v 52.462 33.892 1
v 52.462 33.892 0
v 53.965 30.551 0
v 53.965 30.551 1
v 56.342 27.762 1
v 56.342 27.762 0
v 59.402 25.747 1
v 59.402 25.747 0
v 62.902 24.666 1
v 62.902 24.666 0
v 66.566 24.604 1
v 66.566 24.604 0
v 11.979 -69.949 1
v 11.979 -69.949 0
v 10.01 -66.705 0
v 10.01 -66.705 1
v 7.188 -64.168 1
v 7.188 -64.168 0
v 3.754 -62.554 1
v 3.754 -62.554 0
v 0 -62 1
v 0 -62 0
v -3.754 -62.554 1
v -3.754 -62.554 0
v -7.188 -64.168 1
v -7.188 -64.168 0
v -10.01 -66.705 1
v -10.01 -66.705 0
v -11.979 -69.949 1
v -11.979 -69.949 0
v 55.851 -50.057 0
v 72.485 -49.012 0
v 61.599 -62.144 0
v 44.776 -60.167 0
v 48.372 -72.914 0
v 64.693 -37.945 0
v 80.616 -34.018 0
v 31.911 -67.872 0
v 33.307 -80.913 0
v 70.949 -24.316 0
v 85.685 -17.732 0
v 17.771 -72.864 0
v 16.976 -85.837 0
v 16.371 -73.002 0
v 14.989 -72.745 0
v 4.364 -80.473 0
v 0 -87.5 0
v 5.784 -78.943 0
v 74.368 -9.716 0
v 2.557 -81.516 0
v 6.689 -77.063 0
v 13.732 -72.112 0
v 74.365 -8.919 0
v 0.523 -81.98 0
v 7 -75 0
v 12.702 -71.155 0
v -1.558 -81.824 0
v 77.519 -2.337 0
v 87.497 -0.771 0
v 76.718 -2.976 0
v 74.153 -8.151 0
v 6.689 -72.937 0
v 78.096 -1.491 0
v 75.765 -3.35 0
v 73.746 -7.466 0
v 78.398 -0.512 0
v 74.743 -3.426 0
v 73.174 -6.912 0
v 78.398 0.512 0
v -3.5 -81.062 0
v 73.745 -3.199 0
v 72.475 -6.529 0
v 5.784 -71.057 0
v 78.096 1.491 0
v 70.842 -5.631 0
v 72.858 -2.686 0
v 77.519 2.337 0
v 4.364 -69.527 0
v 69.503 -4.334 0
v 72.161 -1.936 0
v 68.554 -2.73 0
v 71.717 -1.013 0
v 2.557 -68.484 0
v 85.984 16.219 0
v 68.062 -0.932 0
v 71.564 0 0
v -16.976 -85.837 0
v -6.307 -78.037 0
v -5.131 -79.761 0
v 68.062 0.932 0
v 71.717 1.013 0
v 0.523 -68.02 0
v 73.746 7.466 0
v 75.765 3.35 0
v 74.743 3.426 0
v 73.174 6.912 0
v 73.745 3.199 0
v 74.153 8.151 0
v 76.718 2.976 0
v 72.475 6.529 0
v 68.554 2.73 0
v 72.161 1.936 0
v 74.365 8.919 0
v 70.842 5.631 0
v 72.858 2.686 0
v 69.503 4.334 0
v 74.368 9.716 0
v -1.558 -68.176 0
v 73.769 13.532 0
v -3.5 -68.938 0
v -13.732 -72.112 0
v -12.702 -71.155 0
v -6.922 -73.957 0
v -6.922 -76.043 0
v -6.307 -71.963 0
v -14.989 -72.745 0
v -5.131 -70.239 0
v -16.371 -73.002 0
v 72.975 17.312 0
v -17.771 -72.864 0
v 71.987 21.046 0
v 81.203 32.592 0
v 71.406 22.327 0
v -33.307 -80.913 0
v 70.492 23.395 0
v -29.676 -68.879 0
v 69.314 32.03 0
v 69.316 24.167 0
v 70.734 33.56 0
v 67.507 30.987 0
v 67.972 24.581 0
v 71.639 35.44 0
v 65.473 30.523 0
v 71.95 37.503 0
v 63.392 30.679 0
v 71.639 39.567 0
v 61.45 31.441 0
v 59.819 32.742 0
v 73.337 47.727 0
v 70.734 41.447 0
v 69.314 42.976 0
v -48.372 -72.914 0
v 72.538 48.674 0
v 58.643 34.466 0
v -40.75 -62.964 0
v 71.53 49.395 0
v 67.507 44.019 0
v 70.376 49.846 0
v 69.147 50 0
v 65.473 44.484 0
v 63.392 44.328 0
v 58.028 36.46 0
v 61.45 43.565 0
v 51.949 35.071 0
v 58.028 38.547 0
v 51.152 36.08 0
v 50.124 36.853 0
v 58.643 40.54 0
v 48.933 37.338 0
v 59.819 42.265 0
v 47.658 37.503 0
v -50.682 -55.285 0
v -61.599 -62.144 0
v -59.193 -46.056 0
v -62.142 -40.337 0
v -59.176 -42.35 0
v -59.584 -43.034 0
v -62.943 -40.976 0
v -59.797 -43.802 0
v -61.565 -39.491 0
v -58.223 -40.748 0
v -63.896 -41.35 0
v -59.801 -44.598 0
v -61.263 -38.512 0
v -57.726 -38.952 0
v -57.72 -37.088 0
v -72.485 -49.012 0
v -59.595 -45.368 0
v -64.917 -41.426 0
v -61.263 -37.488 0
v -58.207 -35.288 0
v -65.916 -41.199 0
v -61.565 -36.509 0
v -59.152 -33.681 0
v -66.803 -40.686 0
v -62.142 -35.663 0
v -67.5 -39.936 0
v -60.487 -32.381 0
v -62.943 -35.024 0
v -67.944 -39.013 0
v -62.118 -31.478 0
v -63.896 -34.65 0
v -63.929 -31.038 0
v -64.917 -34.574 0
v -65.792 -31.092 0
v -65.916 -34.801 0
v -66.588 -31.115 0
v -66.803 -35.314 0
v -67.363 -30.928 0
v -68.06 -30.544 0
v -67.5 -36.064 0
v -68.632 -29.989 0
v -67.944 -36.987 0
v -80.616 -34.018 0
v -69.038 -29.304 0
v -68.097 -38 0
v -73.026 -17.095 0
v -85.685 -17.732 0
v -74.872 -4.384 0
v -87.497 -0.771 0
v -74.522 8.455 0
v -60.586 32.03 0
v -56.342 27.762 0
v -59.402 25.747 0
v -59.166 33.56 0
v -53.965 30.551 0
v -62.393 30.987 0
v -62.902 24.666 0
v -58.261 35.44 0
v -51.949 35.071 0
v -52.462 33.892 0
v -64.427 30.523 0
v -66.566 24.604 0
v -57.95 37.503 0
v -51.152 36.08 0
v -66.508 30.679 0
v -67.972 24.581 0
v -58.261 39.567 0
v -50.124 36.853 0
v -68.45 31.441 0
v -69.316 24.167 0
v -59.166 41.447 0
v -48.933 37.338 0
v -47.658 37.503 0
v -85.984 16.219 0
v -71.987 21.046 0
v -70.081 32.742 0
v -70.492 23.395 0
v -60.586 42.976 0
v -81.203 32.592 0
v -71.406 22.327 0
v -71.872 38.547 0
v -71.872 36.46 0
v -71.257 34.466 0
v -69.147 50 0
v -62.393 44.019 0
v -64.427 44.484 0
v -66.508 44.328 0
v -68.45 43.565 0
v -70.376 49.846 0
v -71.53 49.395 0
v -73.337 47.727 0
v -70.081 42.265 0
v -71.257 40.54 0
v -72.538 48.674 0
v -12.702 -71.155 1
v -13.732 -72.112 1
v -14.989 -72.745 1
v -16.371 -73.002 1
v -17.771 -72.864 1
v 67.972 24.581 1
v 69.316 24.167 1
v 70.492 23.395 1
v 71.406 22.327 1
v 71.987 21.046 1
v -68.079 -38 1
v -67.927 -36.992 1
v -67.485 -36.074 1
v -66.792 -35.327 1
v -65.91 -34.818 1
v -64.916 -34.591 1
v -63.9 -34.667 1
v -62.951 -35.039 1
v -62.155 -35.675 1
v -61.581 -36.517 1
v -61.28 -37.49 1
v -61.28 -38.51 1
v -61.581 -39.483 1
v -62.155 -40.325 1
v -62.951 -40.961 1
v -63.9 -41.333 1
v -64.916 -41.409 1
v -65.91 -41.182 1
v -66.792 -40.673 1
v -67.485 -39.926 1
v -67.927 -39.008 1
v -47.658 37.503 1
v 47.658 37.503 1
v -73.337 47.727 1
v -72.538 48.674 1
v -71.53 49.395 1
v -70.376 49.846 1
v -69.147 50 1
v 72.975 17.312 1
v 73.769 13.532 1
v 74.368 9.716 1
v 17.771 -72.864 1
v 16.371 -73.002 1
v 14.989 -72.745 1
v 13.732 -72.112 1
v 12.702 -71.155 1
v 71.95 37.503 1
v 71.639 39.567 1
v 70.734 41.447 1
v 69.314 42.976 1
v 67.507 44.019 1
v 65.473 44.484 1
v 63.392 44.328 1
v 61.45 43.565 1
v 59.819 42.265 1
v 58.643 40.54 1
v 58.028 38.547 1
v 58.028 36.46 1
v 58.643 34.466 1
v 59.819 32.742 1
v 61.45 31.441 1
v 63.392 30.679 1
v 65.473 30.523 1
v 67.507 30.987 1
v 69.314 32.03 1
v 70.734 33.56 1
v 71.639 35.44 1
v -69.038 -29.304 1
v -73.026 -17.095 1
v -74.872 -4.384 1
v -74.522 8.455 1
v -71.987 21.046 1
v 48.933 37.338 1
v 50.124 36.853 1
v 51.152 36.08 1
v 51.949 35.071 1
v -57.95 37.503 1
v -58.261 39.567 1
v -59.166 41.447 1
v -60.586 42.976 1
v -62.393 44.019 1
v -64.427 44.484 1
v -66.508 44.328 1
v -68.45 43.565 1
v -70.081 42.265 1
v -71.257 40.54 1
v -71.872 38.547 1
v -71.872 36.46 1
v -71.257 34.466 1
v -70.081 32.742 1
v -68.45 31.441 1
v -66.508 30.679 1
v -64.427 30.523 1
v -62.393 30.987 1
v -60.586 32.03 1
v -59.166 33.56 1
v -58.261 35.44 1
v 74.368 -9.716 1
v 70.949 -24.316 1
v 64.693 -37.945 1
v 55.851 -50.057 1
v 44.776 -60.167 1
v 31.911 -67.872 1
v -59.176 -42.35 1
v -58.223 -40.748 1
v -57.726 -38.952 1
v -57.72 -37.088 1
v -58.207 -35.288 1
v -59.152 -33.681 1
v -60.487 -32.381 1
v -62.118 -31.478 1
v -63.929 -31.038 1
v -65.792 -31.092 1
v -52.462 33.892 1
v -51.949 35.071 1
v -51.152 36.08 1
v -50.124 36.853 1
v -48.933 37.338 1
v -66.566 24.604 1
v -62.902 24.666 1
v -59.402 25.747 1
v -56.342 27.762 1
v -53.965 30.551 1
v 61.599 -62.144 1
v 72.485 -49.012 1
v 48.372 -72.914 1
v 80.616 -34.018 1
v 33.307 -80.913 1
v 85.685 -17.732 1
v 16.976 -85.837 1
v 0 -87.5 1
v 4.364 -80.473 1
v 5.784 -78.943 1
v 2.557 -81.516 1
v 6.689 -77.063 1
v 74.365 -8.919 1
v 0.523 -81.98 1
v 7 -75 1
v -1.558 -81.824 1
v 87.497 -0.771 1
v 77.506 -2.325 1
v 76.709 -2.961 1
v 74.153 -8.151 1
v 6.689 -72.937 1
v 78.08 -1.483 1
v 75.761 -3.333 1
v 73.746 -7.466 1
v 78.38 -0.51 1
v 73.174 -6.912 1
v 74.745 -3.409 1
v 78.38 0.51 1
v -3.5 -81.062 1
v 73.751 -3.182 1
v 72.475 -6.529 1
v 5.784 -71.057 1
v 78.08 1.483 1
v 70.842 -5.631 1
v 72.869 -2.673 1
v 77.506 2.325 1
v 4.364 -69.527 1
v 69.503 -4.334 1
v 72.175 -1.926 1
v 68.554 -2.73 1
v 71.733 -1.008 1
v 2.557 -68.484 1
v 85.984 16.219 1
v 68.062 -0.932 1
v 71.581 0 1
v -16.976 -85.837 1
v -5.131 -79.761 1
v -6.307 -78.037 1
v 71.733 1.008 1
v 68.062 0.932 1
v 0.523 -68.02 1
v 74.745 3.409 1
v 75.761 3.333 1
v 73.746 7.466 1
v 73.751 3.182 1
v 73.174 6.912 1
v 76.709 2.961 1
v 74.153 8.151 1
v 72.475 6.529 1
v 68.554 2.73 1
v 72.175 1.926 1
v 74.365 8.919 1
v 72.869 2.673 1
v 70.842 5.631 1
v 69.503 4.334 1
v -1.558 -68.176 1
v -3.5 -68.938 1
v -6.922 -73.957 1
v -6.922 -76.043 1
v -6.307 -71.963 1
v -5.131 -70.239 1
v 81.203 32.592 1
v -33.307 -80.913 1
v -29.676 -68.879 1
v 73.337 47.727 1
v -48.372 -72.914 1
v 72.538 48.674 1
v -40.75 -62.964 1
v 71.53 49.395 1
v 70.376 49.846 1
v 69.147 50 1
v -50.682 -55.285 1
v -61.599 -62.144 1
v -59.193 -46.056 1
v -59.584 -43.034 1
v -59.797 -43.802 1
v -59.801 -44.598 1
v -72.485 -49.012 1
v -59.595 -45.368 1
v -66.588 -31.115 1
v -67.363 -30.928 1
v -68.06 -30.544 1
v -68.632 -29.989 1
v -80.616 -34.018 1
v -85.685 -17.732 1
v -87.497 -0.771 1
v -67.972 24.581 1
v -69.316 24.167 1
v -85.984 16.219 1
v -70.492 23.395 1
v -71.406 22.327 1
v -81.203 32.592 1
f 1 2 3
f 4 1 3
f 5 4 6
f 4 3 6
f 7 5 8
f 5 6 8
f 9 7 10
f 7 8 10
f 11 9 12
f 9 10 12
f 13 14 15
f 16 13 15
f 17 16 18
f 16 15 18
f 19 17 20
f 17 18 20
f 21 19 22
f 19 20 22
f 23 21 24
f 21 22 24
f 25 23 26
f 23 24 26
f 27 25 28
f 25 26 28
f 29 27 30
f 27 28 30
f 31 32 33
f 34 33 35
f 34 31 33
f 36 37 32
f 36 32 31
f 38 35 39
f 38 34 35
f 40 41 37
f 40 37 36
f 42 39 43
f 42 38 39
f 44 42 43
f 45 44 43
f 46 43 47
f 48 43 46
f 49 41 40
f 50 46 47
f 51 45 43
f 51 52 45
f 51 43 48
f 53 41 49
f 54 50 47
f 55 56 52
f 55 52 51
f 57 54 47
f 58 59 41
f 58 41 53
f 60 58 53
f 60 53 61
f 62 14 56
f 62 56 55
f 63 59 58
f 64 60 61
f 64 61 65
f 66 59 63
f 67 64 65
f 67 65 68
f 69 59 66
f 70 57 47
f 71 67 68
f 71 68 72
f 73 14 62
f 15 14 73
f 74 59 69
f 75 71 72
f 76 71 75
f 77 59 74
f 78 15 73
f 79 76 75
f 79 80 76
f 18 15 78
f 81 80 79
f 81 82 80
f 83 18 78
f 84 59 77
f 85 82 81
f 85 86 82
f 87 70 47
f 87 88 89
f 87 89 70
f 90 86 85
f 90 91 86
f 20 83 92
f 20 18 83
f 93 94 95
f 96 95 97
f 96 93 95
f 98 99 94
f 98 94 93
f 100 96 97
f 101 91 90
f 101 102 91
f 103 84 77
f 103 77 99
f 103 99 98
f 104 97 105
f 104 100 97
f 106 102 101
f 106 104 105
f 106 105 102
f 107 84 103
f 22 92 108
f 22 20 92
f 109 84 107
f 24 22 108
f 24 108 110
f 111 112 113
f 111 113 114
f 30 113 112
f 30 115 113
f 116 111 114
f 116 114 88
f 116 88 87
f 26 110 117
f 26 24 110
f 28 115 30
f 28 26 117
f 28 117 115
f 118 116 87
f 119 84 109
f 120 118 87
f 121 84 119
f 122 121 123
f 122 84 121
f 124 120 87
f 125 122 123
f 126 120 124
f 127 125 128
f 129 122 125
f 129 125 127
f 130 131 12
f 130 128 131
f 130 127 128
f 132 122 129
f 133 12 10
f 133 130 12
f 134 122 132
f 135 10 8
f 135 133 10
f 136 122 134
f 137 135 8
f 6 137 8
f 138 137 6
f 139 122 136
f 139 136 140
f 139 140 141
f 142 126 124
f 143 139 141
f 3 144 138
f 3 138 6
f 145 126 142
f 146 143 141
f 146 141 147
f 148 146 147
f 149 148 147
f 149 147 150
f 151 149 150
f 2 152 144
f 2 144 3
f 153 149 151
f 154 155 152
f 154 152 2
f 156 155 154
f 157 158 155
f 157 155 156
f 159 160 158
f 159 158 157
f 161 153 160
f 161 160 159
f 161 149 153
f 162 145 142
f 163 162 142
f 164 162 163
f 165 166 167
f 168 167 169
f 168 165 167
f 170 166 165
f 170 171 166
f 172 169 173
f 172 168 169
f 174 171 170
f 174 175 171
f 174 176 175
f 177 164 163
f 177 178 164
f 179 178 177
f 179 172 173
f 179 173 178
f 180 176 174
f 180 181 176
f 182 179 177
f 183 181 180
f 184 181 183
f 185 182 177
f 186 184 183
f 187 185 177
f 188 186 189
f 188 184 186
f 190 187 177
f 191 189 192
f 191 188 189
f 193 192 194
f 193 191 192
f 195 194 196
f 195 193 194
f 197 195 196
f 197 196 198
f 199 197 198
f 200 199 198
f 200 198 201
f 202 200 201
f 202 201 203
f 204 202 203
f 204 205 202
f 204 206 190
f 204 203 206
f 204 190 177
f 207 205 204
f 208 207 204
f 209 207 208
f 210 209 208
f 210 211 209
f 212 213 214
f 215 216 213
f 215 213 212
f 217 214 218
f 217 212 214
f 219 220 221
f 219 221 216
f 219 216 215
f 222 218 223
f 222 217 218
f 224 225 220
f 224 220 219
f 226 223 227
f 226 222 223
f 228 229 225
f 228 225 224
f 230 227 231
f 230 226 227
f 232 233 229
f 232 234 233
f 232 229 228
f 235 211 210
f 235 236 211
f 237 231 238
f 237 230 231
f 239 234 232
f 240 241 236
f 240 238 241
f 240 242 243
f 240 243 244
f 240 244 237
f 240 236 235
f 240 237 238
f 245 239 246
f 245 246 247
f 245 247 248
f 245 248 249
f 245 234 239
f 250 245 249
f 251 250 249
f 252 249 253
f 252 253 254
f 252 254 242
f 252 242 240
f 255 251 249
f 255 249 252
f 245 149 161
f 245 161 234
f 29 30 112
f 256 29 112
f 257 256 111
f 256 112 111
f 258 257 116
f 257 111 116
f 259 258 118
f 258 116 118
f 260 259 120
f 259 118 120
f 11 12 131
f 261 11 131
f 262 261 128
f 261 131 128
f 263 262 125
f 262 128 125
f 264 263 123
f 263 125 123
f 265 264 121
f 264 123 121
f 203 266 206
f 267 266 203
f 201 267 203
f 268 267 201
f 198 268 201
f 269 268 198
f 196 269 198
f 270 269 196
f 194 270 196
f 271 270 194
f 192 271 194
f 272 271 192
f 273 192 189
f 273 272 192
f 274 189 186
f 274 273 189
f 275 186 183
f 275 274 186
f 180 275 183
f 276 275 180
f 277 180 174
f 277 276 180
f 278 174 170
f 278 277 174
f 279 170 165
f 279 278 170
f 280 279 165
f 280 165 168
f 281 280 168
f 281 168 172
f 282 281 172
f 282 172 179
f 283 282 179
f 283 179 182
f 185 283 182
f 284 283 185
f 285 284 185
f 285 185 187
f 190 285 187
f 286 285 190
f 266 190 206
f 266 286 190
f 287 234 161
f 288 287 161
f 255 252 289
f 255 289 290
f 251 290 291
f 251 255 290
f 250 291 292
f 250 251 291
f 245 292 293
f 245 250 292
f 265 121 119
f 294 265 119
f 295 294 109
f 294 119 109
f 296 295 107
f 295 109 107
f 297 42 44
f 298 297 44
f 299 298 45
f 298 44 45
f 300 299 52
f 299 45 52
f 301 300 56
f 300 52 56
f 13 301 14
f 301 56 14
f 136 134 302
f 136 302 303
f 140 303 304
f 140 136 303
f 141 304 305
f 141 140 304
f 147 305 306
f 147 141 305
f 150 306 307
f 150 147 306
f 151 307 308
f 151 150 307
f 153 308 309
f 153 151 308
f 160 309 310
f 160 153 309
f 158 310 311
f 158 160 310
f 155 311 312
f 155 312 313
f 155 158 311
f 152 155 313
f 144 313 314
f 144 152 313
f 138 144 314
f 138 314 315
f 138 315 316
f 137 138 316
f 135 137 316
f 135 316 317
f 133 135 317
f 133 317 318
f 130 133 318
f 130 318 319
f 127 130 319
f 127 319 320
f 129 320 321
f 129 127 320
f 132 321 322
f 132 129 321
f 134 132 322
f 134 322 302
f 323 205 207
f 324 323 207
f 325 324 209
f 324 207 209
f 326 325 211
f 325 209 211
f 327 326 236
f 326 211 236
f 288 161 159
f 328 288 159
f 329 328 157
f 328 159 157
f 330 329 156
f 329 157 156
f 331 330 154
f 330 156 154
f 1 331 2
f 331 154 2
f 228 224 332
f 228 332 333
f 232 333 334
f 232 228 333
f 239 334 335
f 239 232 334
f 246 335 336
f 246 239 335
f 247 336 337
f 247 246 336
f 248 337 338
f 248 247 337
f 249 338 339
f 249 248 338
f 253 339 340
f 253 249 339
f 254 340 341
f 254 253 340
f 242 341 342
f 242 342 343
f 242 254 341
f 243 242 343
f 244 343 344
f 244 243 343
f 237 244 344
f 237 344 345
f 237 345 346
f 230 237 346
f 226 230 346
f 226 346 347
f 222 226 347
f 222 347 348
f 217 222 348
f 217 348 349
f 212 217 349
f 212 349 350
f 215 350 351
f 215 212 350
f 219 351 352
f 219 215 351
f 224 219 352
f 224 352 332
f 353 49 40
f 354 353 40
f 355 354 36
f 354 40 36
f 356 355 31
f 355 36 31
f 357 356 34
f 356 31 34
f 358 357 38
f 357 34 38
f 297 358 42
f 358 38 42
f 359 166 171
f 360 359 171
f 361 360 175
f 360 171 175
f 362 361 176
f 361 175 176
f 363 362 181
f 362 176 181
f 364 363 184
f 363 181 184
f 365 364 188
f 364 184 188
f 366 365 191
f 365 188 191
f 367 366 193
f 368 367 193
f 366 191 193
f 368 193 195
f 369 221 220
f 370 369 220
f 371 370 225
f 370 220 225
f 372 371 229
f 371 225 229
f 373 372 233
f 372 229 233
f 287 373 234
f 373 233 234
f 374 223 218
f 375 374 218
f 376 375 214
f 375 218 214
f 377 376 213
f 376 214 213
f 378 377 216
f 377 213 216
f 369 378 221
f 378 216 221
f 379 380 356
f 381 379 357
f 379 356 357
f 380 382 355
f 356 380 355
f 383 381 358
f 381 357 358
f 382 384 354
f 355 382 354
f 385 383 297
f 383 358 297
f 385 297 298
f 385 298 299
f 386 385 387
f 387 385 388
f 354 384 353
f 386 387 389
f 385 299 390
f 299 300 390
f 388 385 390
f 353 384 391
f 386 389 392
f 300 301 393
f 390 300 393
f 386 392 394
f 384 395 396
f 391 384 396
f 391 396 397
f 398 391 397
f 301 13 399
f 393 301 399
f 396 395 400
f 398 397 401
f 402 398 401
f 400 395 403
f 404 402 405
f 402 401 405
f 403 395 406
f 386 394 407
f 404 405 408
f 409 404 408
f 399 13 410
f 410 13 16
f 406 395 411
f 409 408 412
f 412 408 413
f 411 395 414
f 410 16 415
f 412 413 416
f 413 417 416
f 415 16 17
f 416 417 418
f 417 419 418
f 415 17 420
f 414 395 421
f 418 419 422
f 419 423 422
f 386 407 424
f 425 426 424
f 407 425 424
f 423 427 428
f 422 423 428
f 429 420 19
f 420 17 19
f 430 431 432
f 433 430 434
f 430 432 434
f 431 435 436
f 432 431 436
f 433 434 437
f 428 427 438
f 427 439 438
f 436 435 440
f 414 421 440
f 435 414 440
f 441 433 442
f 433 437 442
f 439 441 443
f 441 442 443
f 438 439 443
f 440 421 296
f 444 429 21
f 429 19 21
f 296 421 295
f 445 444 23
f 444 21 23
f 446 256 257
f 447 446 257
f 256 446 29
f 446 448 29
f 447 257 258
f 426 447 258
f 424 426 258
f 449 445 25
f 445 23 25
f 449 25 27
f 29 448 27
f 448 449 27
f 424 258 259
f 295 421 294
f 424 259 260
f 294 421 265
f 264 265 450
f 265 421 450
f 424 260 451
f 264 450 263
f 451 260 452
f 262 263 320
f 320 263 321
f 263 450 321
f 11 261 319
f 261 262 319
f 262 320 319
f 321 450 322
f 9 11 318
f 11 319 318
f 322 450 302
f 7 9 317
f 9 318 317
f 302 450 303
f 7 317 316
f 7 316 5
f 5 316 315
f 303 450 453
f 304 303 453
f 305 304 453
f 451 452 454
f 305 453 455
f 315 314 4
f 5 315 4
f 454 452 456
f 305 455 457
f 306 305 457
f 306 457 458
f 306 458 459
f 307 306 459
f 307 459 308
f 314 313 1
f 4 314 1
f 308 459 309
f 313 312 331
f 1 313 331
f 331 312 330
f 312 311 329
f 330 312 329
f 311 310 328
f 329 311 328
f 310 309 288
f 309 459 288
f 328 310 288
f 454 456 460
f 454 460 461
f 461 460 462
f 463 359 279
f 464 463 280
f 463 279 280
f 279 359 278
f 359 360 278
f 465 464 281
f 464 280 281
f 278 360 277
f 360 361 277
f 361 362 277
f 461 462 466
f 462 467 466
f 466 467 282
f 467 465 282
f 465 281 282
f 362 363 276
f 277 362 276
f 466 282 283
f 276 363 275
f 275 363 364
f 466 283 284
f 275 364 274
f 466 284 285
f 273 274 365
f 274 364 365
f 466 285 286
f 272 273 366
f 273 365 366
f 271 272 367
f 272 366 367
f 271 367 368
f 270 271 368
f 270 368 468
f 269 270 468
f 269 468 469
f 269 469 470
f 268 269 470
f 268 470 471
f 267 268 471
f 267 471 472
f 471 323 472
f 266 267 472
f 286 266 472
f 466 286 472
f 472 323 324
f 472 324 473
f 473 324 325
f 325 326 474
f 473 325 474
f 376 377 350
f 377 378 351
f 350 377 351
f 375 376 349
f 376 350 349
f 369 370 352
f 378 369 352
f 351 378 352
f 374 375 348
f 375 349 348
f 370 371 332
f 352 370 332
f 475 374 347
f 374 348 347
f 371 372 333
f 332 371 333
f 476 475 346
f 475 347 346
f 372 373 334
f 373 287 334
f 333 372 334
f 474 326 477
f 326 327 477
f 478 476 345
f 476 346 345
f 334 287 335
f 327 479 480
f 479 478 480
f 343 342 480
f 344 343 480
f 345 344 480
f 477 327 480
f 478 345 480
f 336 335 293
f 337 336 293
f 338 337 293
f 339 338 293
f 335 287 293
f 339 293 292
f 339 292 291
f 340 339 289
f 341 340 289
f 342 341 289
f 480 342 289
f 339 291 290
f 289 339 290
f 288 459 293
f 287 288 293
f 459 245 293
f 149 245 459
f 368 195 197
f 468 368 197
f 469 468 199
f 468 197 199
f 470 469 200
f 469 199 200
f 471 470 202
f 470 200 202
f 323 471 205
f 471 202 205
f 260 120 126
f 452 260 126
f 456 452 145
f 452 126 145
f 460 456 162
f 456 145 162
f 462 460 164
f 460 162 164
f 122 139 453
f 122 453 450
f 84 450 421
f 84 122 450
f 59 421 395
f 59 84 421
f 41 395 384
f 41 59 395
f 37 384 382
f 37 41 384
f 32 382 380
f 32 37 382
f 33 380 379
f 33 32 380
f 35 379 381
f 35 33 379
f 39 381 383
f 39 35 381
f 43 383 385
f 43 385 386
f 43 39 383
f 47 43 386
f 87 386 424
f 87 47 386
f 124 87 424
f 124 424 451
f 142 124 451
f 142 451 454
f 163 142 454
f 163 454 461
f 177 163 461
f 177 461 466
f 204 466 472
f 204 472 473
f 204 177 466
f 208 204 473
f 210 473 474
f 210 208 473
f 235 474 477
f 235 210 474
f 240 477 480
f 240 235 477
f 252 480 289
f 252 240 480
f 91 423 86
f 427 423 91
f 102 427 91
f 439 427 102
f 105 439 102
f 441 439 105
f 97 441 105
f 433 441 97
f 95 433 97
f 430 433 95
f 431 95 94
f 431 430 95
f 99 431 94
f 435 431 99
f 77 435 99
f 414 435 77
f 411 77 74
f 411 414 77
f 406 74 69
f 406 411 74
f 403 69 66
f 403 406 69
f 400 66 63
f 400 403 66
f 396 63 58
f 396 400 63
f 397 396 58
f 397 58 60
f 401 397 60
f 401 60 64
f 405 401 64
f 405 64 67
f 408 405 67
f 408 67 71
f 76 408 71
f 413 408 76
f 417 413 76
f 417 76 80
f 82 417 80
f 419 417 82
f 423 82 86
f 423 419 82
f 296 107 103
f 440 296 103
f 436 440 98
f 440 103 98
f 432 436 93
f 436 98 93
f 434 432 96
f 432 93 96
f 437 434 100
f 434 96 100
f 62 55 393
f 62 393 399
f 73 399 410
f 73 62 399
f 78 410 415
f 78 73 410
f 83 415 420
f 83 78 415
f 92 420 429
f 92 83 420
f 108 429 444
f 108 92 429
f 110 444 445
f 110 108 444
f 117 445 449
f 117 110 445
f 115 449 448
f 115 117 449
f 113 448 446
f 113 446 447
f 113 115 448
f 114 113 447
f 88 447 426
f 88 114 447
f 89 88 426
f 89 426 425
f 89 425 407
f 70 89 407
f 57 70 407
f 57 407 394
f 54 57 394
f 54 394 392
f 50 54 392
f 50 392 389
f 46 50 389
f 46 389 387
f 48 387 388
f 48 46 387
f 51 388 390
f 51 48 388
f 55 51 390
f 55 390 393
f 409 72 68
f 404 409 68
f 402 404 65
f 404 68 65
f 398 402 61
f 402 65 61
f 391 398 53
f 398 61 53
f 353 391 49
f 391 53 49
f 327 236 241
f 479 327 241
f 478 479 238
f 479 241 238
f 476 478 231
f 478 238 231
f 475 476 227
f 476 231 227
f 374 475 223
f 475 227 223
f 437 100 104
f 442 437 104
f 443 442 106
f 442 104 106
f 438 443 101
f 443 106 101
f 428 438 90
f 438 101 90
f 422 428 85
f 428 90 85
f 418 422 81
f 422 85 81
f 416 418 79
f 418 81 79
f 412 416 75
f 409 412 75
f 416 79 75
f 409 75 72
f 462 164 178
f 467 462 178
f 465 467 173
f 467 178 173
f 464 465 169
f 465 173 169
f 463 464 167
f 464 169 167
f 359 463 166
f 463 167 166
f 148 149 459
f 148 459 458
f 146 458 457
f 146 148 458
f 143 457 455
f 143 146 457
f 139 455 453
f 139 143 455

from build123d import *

# Parameters (mm, degrees)
SKETCH_1_R      = 7
EXTRUDE_1_DEPTH = 1
SKETCH_2_R      = 3.75
SKETCH_3_R      = 3
SKETCH_2_4_R    = 3.75
SKETCH_3_4_R    = 3


with BuildPart() as part:
    # Эскиз1 → Бобышка-Вытянуть1 (new body)
    with BuildSketch(Plane.XY):
        with BuildLine():
            Line((-69.14658343, 50), (69.14658343, 50))
            ThreePointArc((69.14658343, 50), (71.530239903, 49.395245365), (73.337285456, 47.727272727))
            ThreePointArc((73.337285456, 47.727272727), (0, -87.5), (-73.337285456, 47.727272727))
            ThreePointArc((-73.337285456, 47.727272727), (-71.530239903, 49.395245365), (-69.14658343, 50))
        make_face()
        with Locations((-64.95, 37.503299855)):
            Circle(SKETCH_1_R, mode=Mode.SUBTRACT)
        with Locations((64.95, 37.503299855)):
            Circle(SKETCH_1_R, mode=Mode.SUBTRACT)
        with Locations((0, -75)):
            Circle(SKETCH_1_R, mode=Mode.SUBTRACT)
        with BuildLine():
            Line((-47.658383534, 37.503299855), (47.658383534, 37.503299855))
            ThreePointArc((47.658383534, 37.503299855), (50.663009597, 36.499826124), (52.46161033, 33.892188744))
            ThreePointArc((52.46161033, 33.892188744), (57.800209242, 26.646021554), (66.56595151, 24.604125435))
            ThreePointArc((66.56595151, 24.604125435), (69.931223097, 23.822835867), (71.986576416, 21.045969112))
            ThreePointArc((71.986576416, 21.045969112), (73.39628095, 15.426793015), (74.368055556, 9.715570641))
            ThreePointArc((74.368055556, 9.715570641), (73.972679073, 7.794963627), (72.475333333, 6.528863471))
            ThreePointArc((72.475333333, 6.528863471), (68, 0), (72.475333333, -6.528863471))
            ThreePointArc((72.475333333, -6.528863471), (73.972679073, -7.794963627), (74.368055556, -9.715570641))
            ThreePointArc((74.368055556, -9.715570641), (55.850918931, -50.056716378), (17.770646228, -72.864285714))
            ThreePointArc((17.770646228, -72.864285714), (14.338112526, -72.472905294), (11.978731902, -69.949259259))
            ThreePointArc((11.978731902, -69.949259259), (0, -62), (-11.978731902, -69.949259259))
            ThreePointArc((-11.978731902, -69.949259259), (-14.338112526, -72.472905294), (-17.770646228, -72.864285714))
            ThreePointArc((-17.770646228, -72.864285714), (-40.749625279, -62.964021787), (-59.19327098, -46.056016661))
            ThreePointArc((-59.19327098, -46.056016661), (-59.825507849, -44.199856536), (-59.176073891, -42.349643196))
            ThreePointArc((-59.176073891, -42.349643196), (-58.625658395, -34.453333333), (-65.791988875, -31.092027915))
            ThreePointArc((-65.791988875, -31.092027915), (-67.724404324, -30.759124925), (-69.038382563, -29.303612969))
            ThreePointArc((-69.038382563, -29.303612969), (-74.871756142, -4.384077128), (-71.986576416, 21.045969112))
            ThreePointArc((-71.986576416, 21.045969112), (-69.931223097, 23.822835867), (-66.56595151, 24.604125435))
            ThreePointArc((-66.56595151, 24.604125435), (-57.800209242, 26.646021554), (-52.46161033, 33.892188744))
            ThreePointArc((-52.46161033, 33.892188744), (-50.663009597, 36.499826124), (-47.658383534, 37.503299855))
        make_face(mode=Mode.SUBTRACT)
    extrude(amount=EXTRUDE_1_DEPTH)

    # Эскиз2 → Вырез-По сечениям1 section 0
    with BuildSketch(Plane(origin=(0, 0, -18), x_dir=(-1, 0, 0), z_dir=(0, 0, -1))):
        with Locations((64.660652641, -38)):
            Circle(SKETCH_2_R)
    # Эскиз3 → Вырез-По сечениям1 section 1
    with BuildSketch(Plane.XY.offset(25)):
        with Locations((-64.660652641, -38)):
            Circle(SKETCH_3_R)
    loft(mode=Mode.SUBTRACT)

    # Эскиз2<4> → Вырез-По сечениям2 section 0
    with BuildSketch(Plane(origin=(0, 0, -18), x_dir=(-1, 0, 0), z_dir=(0, 0, -1))):
        with Locations((-75, 0)):
            Circle(SKETCH_2_4_R)
    # Эскиз3<4> → Вырез-По сечениям2 section 1
    with BuildSketch(Plane.XY.offset(25)):
        with Locations((75, 0)):
            Circle(SKETCH_3_4_R)
    loft(mode=Mode.SUBTRACT)


solid = part.part
